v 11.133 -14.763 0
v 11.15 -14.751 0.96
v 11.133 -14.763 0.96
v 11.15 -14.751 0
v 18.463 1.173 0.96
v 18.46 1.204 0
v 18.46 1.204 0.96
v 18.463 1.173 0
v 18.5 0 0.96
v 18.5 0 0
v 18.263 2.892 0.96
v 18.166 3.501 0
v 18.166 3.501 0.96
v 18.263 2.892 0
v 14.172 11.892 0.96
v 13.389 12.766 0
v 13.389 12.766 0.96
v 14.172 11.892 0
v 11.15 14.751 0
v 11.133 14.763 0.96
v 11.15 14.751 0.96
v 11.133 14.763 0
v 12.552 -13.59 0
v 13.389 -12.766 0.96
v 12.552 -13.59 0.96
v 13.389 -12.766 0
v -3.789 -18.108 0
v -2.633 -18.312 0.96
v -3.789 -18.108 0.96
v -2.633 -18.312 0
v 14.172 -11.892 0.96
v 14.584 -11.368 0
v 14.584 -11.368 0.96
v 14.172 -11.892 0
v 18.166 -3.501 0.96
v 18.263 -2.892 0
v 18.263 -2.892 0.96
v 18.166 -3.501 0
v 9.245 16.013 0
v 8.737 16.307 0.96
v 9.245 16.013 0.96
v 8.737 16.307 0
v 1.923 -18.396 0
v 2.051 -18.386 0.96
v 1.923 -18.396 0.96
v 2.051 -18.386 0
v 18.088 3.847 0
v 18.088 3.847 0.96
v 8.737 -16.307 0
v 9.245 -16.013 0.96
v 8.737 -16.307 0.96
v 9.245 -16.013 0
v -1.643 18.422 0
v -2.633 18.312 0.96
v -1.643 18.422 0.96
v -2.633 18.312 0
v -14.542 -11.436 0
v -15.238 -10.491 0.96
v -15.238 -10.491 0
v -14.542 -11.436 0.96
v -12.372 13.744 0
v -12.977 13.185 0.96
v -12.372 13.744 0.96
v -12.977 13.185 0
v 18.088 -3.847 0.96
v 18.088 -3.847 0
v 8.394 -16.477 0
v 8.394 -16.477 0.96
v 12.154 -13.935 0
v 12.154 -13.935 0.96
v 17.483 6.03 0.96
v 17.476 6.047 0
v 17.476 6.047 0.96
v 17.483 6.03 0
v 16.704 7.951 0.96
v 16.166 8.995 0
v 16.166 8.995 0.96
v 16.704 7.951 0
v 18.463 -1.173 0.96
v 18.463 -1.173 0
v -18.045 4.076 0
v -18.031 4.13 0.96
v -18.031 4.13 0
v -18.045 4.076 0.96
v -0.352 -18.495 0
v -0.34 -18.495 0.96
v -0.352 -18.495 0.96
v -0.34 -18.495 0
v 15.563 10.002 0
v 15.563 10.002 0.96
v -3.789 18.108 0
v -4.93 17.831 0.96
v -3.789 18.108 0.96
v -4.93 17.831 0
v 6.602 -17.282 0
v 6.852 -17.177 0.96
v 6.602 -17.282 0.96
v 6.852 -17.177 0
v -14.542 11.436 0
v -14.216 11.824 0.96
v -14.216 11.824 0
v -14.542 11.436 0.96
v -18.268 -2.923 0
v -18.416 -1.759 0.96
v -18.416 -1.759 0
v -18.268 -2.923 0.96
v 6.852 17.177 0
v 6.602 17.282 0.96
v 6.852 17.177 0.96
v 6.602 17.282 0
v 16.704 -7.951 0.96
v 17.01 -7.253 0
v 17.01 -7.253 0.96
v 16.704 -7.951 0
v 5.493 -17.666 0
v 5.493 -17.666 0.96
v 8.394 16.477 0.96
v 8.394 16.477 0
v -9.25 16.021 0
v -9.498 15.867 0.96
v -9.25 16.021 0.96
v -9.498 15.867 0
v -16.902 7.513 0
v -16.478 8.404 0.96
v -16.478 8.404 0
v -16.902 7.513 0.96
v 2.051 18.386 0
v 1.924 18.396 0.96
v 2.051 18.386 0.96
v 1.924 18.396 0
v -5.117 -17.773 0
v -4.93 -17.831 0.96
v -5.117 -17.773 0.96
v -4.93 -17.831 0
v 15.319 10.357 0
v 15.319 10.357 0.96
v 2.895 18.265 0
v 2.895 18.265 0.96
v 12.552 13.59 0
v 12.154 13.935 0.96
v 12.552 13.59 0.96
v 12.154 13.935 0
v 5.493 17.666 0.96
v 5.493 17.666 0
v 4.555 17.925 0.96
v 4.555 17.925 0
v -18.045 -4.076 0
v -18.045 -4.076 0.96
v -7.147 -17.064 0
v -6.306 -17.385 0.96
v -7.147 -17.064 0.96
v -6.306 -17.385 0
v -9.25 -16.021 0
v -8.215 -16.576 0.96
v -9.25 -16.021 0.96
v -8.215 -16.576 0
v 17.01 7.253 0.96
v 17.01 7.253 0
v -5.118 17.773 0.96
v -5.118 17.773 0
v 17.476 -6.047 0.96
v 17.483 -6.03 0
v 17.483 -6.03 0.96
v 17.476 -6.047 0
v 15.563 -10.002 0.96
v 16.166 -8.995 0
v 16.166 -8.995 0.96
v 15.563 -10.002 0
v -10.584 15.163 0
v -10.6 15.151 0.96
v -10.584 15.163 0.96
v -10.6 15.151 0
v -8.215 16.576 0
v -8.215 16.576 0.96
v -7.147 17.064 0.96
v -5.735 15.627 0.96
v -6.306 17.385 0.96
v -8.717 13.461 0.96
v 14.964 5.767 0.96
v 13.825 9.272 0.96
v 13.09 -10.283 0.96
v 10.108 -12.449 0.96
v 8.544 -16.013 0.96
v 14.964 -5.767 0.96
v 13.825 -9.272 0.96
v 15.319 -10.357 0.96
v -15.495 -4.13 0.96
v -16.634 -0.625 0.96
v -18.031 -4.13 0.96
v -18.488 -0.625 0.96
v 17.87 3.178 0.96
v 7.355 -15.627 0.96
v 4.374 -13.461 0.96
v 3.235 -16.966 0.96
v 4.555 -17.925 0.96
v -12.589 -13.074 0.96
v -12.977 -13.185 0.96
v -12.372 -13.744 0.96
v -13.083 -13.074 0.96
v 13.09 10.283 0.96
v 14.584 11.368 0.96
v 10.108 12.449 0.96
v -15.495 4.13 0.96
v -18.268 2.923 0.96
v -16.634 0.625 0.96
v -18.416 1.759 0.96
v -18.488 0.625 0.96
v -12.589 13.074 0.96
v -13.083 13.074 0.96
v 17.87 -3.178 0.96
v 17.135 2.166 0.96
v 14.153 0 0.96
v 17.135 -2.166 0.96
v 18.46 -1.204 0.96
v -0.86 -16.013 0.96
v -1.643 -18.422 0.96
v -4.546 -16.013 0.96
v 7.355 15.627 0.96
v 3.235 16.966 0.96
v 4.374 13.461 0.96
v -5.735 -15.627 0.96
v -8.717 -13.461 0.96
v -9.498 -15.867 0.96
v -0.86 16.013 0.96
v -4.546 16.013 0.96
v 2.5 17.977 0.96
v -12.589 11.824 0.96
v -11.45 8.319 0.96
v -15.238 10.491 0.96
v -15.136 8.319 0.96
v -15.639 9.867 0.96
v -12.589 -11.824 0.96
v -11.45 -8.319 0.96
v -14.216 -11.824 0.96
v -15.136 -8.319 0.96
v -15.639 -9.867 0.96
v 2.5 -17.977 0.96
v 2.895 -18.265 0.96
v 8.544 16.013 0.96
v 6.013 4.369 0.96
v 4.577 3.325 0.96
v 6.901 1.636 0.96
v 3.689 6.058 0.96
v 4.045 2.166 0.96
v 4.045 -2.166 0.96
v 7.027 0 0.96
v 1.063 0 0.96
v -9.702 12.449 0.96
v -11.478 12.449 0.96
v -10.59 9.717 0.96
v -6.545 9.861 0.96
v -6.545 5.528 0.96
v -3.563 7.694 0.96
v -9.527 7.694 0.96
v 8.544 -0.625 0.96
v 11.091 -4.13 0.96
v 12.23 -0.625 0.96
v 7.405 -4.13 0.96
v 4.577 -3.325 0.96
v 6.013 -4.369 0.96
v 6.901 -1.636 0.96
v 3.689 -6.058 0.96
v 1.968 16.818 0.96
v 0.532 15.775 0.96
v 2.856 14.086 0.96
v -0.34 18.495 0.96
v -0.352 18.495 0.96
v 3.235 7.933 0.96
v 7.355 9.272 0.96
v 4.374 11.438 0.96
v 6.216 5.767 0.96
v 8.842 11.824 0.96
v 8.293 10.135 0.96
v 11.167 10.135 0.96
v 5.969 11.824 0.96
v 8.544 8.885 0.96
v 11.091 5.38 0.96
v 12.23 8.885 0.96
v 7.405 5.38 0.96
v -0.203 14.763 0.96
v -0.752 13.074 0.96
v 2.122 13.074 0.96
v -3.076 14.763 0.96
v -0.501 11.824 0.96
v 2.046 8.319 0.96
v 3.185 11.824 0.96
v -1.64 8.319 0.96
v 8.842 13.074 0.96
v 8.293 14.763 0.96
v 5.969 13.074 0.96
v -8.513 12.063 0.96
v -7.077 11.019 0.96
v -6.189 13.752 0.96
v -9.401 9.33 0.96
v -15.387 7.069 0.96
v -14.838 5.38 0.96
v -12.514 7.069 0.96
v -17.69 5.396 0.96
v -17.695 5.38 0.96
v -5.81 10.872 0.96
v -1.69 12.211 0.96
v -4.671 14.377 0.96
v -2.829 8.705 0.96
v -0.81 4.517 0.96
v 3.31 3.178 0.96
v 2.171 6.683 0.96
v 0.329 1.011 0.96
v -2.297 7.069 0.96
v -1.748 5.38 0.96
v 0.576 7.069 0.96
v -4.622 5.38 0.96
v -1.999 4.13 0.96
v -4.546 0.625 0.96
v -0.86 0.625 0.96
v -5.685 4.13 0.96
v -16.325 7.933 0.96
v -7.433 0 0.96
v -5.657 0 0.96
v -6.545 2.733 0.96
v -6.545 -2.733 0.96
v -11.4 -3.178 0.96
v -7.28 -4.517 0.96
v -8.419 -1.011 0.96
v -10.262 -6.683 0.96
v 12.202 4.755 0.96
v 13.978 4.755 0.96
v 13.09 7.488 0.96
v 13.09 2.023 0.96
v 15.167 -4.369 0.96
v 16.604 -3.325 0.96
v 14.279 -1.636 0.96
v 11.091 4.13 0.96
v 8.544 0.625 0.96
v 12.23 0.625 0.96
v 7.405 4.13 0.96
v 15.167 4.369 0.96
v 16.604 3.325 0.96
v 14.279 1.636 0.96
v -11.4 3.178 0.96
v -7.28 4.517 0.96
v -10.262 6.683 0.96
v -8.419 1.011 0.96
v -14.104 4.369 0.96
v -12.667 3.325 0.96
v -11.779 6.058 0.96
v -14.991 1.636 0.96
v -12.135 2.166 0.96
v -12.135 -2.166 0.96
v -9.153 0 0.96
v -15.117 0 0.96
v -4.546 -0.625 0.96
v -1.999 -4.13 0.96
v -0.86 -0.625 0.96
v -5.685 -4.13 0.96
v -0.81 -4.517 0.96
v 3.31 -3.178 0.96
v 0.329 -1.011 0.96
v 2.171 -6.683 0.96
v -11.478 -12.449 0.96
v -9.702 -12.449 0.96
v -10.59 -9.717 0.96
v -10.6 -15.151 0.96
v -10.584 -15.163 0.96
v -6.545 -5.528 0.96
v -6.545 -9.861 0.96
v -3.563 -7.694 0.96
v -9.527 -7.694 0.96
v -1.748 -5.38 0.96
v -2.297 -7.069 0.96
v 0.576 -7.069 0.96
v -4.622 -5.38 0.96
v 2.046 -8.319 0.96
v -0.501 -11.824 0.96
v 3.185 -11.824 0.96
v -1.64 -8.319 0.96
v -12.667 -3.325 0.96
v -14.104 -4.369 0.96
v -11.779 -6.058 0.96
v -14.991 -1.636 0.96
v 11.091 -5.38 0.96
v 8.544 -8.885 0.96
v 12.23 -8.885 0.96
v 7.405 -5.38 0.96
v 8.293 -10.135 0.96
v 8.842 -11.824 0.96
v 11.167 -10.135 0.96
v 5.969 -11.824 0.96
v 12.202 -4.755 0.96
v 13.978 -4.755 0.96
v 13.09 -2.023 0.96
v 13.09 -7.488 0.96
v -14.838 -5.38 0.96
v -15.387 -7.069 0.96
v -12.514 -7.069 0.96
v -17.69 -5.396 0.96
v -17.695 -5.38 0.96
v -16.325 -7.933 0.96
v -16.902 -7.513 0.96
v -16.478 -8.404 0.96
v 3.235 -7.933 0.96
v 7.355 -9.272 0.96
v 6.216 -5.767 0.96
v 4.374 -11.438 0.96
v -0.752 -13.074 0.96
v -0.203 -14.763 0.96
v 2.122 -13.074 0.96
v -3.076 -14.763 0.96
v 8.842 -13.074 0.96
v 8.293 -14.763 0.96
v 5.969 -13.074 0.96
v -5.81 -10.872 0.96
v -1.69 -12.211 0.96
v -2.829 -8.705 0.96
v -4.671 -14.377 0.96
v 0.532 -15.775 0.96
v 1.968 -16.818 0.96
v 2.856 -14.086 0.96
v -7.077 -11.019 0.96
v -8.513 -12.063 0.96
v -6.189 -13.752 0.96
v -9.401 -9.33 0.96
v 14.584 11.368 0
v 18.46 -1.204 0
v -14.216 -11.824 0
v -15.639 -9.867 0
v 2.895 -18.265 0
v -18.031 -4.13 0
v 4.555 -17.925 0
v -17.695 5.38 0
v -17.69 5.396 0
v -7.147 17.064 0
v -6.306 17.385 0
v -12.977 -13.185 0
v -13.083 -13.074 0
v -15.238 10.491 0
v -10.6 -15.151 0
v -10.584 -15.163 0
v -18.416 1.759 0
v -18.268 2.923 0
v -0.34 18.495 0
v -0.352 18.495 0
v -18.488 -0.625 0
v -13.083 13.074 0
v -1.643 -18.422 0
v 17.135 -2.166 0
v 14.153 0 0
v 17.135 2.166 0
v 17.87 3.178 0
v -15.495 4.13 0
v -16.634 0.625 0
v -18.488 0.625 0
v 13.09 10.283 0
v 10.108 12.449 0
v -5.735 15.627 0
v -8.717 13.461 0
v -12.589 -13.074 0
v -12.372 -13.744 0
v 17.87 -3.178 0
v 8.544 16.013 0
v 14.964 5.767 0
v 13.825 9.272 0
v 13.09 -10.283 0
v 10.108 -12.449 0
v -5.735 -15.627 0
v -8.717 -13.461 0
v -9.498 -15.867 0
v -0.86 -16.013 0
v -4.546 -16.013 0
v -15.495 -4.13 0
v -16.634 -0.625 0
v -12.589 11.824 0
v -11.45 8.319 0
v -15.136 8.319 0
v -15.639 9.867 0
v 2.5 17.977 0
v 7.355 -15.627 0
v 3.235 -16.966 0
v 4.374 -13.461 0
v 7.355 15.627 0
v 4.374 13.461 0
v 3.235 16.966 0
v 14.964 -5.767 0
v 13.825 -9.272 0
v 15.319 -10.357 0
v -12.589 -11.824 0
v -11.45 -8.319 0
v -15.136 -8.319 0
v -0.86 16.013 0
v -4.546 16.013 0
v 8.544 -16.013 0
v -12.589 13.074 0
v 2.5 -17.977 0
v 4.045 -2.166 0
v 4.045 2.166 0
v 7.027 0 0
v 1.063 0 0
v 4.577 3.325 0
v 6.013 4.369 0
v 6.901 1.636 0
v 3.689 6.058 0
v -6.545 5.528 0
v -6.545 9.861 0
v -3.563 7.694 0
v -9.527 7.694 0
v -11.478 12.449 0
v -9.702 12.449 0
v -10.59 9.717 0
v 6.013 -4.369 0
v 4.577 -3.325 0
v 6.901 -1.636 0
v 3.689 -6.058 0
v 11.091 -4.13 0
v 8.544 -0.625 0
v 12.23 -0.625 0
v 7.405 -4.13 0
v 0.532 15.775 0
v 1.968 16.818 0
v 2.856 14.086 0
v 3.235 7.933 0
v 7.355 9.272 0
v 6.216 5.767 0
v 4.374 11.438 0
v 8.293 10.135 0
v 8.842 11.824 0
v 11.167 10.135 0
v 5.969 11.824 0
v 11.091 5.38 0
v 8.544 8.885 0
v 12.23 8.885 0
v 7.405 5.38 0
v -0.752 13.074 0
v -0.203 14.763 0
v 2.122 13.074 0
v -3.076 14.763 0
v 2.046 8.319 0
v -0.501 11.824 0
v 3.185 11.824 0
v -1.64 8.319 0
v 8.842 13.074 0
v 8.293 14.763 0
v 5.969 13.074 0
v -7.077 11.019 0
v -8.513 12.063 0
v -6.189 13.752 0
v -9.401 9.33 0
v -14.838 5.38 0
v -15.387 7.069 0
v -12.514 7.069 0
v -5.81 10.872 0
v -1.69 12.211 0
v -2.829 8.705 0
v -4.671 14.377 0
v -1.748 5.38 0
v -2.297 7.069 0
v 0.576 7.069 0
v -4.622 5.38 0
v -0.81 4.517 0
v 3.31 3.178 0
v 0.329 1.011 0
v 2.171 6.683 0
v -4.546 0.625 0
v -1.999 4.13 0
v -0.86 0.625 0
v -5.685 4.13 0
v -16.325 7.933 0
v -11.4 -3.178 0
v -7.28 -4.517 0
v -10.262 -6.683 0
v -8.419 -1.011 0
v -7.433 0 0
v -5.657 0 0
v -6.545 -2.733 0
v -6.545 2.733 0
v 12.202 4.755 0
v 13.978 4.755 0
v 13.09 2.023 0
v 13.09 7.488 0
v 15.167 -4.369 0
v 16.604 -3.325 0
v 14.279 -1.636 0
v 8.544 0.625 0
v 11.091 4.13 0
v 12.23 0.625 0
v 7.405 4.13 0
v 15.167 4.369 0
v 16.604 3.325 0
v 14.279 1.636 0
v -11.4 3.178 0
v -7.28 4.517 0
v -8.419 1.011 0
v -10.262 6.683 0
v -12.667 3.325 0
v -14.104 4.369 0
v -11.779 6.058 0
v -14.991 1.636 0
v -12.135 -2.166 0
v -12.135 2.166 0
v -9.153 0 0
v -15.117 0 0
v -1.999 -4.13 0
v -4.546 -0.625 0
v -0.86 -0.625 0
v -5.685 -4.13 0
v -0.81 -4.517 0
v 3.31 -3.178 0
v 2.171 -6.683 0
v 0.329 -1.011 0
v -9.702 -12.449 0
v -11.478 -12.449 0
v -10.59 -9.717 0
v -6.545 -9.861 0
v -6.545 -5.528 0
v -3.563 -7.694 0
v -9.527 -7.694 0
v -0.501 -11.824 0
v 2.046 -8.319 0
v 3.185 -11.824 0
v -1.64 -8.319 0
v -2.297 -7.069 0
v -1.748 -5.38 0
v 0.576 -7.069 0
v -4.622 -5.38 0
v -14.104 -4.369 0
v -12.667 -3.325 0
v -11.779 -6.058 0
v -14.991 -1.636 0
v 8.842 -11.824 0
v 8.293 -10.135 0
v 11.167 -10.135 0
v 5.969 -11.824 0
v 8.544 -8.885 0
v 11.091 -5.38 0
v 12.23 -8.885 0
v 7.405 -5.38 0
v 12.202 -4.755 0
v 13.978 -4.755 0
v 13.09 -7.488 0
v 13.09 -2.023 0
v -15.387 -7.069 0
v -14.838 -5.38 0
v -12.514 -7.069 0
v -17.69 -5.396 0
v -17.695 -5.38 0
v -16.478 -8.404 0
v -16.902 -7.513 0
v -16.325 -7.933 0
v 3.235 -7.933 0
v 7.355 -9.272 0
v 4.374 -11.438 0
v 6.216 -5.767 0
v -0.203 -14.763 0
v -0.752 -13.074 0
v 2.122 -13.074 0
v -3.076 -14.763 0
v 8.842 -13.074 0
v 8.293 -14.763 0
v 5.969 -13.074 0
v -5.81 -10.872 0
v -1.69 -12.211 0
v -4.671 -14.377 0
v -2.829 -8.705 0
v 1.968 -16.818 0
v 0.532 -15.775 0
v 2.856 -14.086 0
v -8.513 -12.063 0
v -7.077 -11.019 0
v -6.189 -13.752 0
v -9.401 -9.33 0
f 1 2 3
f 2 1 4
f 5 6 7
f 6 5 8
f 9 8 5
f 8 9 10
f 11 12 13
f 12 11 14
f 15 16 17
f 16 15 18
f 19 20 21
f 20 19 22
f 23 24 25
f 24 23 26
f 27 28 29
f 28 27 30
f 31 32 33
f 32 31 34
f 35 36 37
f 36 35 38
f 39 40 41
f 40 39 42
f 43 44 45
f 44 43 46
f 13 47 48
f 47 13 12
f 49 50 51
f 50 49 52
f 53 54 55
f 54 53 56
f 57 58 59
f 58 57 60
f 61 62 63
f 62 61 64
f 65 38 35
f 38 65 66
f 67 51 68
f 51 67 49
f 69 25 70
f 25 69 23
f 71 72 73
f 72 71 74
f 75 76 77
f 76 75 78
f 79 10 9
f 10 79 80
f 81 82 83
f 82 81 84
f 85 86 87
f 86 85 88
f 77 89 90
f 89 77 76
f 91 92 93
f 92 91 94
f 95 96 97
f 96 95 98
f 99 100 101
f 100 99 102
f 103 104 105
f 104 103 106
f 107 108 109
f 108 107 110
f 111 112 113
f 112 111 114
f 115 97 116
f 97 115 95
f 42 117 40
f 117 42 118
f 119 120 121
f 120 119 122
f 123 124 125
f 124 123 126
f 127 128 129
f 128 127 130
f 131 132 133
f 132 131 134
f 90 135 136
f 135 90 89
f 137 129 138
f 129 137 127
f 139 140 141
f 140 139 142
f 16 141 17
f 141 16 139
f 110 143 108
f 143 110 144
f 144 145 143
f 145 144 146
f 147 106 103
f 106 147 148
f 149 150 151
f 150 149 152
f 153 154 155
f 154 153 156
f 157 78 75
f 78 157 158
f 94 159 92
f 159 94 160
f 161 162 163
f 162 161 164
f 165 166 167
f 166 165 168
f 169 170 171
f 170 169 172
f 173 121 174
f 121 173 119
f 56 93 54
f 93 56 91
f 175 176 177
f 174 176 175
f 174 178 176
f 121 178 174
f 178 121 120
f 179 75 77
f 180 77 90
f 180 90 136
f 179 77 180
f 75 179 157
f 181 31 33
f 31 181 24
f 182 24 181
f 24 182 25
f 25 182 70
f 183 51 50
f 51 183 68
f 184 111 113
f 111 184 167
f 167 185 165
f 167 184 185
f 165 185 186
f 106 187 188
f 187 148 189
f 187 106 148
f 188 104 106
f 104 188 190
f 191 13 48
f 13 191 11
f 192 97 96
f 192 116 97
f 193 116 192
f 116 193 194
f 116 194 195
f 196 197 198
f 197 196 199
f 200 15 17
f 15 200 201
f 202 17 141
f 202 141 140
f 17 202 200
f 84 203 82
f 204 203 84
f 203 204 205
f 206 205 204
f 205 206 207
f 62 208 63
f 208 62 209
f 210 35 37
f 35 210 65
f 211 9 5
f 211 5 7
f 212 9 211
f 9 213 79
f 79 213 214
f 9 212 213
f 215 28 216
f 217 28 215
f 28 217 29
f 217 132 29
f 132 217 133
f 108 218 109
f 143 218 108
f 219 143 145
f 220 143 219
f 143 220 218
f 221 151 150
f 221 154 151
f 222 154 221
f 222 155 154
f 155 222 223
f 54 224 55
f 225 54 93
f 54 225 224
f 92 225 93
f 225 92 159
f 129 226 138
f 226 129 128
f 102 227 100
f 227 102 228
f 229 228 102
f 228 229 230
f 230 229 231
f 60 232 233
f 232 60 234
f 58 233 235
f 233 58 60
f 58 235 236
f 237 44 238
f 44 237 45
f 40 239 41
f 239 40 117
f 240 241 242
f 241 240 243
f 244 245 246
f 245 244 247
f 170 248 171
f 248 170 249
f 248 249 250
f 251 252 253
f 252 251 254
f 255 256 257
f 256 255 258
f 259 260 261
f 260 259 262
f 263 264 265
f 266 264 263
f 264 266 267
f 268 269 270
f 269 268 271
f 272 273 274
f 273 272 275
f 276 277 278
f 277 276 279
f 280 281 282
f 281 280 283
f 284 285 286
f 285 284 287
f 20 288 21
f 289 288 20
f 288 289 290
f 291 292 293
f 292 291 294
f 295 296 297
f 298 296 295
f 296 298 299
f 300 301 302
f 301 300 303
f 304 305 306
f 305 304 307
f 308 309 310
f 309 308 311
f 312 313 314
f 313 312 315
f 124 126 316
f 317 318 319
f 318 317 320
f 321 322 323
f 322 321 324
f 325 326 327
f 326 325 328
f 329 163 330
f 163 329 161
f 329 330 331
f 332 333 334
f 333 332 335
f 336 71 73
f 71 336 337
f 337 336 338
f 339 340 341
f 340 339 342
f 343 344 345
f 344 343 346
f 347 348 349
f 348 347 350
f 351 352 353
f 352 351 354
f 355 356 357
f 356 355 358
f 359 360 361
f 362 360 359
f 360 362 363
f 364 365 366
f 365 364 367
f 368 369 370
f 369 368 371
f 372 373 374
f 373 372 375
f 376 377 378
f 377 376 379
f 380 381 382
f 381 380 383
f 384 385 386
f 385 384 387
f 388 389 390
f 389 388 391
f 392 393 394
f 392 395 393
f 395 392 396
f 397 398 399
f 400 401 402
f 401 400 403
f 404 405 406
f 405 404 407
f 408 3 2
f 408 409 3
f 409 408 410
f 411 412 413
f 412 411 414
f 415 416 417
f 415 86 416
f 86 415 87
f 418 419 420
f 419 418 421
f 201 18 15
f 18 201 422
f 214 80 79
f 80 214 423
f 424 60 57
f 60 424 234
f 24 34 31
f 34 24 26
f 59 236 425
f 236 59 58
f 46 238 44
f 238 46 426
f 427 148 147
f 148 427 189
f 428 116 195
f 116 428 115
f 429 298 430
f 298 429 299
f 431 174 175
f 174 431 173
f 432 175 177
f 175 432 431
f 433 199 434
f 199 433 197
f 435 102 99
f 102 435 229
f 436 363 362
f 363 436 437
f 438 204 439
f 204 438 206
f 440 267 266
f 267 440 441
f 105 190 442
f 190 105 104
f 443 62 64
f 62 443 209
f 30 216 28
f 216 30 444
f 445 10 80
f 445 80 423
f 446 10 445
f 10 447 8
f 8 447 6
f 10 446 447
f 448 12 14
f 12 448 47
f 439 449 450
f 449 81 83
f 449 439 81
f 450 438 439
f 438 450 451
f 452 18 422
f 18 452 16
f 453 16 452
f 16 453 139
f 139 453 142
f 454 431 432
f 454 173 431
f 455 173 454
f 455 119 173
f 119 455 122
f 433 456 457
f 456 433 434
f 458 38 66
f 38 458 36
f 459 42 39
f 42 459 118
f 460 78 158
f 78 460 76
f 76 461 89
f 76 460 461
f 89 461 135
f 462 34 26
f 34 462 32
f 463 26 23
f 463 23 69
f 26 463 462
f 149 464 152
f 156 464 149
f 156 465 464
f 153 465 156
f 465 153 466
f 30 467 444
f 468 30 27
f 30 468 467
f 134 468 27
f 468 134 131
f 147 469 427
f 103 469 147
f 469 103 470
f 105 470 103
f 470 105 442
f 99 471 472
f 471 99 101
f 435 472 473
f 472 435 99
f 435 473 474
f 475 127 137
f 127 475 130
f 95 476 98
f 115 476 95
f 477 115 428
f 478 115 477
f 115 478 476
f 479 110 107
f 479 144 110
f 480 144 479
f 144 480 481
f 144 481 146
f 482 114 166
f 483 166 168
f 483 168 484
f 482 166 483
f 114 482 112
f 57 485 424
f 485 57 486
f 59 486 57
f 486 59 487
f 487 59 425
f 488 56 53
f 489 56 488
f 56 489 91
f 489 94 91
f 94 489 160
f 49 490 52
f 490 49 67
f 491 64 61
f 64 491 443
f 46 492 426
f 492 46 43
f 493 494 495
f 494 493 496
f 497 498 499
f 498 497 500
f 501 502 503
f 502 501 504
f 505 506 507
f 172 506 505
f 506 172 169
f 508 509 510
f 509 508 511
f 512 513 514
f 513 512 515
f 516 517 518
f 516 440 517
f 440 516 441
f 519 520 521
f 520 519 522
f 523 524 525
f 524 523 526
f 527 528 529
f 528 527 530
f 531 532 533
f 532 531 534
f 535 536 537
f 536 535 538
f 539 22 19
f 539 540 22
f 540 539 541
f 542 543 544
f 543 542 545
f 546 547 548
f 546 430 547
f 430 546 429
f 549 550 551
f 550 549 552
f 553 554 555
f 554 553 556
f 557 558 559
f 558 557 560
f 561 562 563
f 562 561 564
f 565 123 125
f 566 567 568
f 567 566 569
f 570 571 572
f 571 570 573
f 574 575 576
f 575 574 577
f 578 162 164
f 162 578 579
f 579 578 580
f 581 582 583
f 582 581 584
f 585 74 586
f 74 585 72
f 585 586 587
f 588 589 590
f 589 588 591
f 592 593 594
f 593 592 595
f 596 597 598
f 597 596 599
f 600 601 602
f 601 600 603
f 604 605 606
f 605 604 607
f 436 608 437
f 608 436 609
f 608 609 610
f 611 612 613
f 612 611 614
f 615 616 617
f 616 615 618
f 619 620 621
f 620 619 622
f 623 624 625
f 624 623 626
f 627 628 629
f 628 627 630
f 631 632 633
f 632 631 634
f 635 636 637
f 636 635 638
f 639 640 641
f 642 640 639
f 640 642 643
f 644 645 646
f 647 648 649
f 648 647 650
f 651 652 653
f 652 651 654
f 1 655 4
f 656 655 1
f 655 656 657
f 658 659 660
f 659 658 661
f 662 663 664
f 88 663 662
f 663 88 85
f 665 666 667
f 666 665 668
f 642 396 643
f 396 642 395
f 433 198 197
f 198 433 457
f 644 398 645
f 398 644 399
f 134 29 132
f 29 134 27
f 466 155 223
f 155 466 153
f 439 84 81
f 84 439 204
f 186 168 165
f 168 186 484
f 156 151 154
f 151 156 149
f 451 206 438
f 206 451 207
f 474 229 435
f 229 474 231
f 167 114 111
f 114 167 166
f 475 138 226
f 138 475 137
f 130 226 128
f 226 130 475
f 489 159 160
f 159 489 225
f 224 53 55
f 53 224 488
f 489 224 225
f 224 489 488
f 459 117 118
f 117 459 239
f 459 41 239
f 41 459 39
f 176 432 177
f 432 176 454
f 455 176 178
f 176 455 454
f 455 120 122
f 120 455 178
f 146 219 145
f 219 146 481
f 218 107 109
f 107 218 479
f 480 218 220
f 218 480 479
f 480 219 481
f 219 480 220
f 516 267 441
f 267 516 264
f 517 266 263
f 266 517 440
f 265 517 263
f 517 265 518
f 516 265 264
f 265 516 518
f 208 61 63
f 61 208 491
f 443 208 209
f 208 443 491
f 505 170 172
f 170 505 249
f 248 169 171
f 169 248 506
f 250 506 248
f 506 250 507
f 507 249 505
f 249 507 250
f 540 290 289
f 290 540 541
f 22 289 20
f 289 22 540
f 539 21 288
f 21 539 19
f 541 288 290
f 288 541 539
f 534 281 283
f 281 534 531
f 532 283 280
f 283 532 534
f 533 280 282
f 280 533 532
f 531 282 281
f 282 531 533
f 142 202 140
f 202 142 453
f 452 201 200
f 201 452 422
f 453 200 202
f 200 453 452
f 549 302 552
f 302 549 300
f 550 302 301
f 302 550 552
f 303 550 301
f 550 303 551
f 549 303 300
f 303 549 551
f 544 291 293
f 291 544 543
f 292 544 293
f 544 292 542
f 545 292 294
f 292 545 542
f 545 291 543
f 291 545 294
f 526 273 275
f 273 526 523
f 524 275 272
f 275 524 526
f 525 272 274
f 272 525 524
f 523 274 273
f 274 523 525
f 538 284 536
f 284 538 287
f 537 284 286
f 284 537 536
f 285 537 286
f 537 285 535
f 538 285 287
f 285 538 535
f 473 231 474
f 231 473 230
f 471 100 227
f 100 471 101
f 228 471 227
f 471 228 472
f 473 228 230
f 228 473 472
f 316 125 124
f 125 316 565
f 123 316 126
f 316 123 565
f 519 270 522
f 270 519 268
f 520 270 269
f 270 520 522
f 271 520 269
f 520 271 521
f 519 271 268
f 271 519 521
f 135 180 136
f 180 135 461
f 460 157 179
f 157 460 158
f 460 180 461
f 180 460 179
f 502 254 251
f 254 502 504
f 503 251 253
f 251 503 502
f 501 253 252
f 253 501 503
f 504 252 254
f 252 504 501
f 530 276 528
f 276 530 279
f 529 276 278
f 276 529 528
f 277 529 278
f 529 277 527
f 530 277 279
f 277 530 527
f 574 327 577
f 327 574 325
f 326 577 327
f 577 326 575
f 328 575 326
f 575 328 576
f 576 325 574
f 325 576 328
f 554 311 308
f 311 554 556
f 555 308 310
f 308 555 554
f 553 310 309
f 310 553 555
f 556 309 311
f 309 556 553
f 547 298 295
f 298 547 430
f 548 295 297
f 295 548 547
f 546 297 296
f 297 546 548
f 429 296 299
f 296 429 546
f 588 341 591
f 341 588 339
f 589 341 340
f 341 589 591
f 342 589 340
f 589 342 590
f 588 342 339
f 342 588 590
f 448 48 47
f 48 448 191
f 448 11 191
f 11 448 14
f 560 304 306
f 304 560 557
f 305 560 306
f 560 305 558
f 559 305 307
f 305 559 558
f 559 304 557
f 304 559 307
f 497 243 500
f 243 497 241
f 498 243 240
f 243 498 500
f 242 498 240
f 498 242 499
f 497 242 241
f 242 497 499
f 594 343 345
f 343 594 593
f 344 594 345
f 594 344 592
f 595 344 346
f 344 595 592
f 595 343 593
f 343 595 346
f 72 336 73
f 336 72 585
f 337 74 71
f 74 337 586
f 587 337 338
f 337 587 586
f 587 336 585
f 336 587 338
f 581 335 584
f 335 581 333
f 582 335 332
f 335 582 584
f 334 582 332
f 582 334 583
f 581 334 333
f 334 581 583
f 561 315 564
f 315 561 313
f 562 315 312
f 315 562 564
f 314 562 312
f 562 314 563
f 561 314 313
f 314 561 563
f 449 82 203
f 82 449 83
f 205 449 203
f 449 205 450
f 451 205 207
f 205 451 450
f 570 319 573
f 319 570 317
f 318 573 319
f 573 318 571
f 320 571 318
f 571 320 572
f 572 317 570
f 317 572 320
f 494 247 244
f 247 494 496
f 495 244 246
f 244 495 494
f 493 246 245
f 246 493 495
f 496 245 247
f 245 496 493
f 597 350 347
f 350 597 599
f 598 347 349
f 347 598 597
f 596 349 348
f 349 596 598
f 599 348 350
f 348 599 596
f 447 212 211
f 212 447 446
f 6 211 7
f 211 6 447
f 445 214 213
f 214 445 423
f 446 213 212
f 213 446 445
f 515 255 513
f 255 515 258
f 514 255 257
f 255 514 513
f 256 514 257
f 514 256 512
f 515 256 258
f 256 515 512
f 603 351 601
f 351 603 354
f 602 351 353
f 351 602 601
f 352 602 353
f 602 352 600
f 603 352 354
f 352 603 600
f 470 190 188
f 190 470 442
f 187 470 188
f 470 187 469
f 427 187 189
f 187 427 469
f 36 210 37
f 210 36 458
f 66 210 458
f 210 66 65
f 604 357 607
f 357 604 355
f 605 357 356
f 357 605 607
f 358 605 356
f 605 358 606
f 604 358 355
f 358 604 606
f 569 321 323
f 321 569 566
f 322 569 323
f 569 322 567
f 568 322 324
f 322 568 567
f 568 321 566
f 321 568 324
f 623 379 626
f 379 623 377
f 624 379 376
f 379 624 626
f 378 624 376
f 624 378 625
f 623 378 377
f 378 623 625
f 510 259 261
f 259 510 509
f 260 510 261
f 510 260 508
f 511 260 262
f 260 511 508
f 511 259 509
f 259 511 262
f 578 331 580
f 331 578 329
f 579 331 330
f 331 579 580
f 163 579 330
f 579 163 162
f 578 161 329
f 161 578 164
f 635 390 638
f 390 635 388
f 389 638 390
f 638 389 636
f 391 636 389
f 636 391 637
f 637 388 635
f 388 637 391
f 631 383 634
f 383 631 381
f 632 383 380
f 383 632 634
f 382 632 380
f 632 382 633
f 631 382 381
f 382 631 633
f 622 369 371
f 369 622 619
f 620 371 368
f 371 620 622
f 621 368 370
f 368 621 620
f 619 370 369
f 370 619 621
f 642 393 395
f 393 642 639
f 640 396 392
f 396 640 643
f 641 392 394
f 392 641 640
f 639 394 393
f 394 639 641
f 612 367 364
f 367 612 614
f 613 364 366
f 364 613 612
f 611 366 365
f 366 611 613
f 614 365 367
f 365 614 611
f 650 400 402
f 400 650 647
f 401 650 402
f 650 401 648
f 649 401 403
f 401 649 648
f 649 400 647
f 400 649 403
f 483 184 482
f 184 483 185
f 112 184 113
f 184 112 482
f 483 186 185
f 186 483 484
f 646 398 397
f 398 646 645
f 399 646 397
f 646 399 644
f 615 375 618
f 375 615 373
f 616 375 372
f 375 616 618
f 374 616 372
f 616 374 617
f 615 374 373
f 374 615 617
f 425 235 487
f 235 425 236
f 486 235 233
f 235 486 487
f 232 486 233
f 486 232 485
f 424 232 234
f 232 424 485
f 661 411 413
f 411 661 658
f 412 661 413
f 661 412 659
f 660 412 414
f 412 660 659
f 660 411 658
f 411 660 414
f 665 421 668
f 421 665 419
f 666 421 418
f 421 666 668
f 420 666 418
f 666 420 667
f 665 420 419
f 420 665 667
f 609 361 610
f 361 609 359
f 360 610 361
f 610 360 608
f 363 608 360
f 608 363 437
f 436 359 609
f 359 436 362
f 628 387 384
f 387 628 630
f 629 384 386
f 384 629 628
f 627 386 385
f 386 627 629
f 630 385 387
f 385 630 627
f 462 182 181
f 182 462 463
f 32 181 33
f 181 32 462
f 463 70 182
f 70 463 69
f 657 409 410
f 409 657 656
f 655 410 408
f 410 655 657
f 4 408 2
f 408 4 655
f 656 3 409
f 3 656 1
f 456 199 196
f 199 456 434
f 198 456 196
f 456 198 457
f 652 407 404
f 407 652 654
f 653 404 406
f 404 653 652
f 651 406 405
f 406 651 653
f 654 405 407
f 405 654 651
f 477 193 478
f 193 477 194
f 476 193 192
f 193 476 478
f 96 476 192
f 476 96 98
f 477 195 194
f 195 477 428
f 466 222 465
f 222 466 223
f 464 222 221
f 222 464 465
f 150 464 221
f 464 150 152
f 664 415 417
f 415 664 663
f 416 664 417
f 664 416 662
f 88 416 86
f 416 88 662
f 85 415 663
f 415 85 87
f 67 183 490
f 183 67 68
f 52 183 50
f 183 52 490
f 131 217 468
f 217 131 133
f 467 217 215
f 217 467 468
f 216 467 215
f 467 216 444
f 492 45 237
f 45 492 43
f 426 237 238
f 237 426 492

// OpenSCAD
//=================================================================================
// Rosalees2.scad
//
//
// Dr Tom Flint, 19 Sept 2025
//=================================================================================

use <../Fractals/Lsystem.scad>

layer=0.24;
nlayer=4;
thick=nlayer*layer;  

r1=65;
F2=99;

cut1=1200;
cut2=470;
mag=1/28;

ntop=1;

nbot=nlayer-ntop;

loop1=20;
loop2=18.5;


//-----------------------------------------------------------------------------------
module full(){
  
  render()
  intersection(){
    translate([0,0,-0.5])
    scale([1,1,1])
    surface(file="./Rosalees3.png", center = true, invert=false);
  
    translate([0,0,thick/2])
    cube([cut1,cut1,thick],center=true);
  }
  
}  

//-----------------------------------------------------------------------------------
module circ(){
  
  render()
  scale([mag,mag,1])
  intersection(){
    full();
    
    translate([0,0,thick/2])
    cylinder(r=cut2,h=5*thick,center=true,$fn=F2);
  }
  
}  

//-----------------------------------------------------------------------------------
module loop(){
  
  render()
  // outer loop and hanger
    difference(){
      hull(){
        cylinder(r=loop1,h=thick,$fn=F2);
        translate([0,22,0])
        cylinder(r=3,h=thick,$fn=F2);
      }
      cylinder(r=loop2,h=5*thick,center=true,$fn=F2);
      translate([0,22,0])
      cylinder(r=1.5,h=5*thick,center=true,$fn=F2);
    }
}  

//-----------------------------------------------------------------------------------
module back(){
  
  render()
  difference(){
    cylinder(r=loop2,h=thick,$fn=F2);
    circ();
  }

}  

//-----------------------------------------------------------------------------------
module backA(){
  
  intersection(){
    back();
    cylinder(r1=0.25*loop2,r2=0.6*loop2,h=thick,$fn=F2);
  }

}  


//-----------------------------------------------------------------------------------
module backB(){
  
  intersection(){
    difference(){
      back();
      cylinder(r1=0.25*loop2,r2=0.6*loop2,h=thick,$fn=F2);
    }
    cylinder(r1=0.6*loop2,r2=0.85*loop2,h=thick,$fn=F2);
    }
}  

//-----------------------------------------------------------------------------------
module backC(){
  
  difference(){
    back();
    cylinder(r1=0.6*loop2,r2=0.85*loop2,h=thick,$fn=F2);
  }

}  

//-----------------------------------------------------------------------------------
module circ2(){
  
  linear_extrude(height=thick,scale=0.95)
  offset(r=0.4)
  projection(cut=false)
  circ();
  
}

//-----------------------------------------------------------------------------------
module top(){
  
    intersection(){
      circ();    
      translate([0,0,ntop*layer/2+nbot*layer])
      cube([800,800,ntop*layer],center=true);
    }
    
    intersection(){
      loop();    
      translate([0,0,ntop*layer/2+nbot*layer])
      cube([800,800,ntop*layer],center=true);
    }

}

//-----------------------------------------------------------------------------------
module base(){
  
    intersection(){
      circ();    
      translate([0,0,nbot*layer/2])
      cube([800,800,nbot*layer],center=true);
    }
    
    intersection(){
      loop();    
      translate([0,0,nbot*layer/2])
      cube([800,800,nbot*layer],center=true);
    }

}

//-----------------------------------------------------------------------------------
module backD(){
  
  render()
  intersection(){
    back();
    translate([0,0,thick/2])
    rotate([0,0,30])
    rotate([a0,0,0])
    translate([0,0,z0])
    cube([80,80,z0],center=true);
  }

}  

//-----------------------------------------------------------------------------------
module backE(){
  
  render()
  intersection(){
    back();
    translate([0,0,thick/2])
    rotate([0,0,30])
    rotate([a0,0,0])
    cube([80,80,z0],center=true);
  }

}  
//-----------------------------------------------------------------------------------
module backF(){
  
  render()
  intersection(){
    back();
    translate([0,0,thick/2])
    rotate([0,0,30])
    rotate([a0,0,0])
    translate([0,0,-z0])
    cube([80,80,z0],center=true);
  }

}  

//-----------------------------------------------------------------------------------
module backG(){
  
  render()
  intersection(){
    back();
    translate([0,0,0])
    rotate([0,0,0])
    scale([2,2,1])
    linear_extrude(height=thick)
    penrose_tiling(n=5, w=0.2);   // Recommended n <= 6

  }

}  
//-----------------------------------------------------------------------------------
module backH(){
  
  render()
  difference(){
    back();
    translate([0,0,0])
    rotate([0,0,0])
    scale([2,2,1])
    linear_extrude(height=thick)
    penrose_tiling(n=5, w=0.2);   // Recommended n <= 6

  }

}  

//-----------------------------------------------------------------------------------
module backI(){
  
  render()
  intersection(){
    back();
    translate([0,0,0])
    rotate([0,0,0])
    scale([s0,s0,1])
    linear_extrude(height=thick)
    penrose_tiling(n=5, w=0.25);   // Recommended n <= 6

  }

}  
//-----------------------------------------------------------------------------------
module backJ(){
  
  render()
  difference(){
    back();
    translate([0,0,0])
    rotate([0,0,0])
    scale([s0,s0,1])
    linear_extrude(height=thick)
    penrose_tiling(n=5, w=0.25);   // Recommended n <= 6

  }

}  

//=================================================================================

//~ intersection(){

//~ full();
//~ circ();
//~ circ2();

//~ loop();
//~ back();

//~ top();
//~ base();

//~ backA();
//~ backB();
//~ backC();

// DEF-1
//~ a0=7;
//~ z0=2*thick;

// DEF-2
a0=4;
z0=1.25*thick;


//~ backD();
//~ backE();
//~ backF();


//~ backG();
//~ backH();

s0=5;

//~ backI();
backJ();

//~ }

//=================================================================================
